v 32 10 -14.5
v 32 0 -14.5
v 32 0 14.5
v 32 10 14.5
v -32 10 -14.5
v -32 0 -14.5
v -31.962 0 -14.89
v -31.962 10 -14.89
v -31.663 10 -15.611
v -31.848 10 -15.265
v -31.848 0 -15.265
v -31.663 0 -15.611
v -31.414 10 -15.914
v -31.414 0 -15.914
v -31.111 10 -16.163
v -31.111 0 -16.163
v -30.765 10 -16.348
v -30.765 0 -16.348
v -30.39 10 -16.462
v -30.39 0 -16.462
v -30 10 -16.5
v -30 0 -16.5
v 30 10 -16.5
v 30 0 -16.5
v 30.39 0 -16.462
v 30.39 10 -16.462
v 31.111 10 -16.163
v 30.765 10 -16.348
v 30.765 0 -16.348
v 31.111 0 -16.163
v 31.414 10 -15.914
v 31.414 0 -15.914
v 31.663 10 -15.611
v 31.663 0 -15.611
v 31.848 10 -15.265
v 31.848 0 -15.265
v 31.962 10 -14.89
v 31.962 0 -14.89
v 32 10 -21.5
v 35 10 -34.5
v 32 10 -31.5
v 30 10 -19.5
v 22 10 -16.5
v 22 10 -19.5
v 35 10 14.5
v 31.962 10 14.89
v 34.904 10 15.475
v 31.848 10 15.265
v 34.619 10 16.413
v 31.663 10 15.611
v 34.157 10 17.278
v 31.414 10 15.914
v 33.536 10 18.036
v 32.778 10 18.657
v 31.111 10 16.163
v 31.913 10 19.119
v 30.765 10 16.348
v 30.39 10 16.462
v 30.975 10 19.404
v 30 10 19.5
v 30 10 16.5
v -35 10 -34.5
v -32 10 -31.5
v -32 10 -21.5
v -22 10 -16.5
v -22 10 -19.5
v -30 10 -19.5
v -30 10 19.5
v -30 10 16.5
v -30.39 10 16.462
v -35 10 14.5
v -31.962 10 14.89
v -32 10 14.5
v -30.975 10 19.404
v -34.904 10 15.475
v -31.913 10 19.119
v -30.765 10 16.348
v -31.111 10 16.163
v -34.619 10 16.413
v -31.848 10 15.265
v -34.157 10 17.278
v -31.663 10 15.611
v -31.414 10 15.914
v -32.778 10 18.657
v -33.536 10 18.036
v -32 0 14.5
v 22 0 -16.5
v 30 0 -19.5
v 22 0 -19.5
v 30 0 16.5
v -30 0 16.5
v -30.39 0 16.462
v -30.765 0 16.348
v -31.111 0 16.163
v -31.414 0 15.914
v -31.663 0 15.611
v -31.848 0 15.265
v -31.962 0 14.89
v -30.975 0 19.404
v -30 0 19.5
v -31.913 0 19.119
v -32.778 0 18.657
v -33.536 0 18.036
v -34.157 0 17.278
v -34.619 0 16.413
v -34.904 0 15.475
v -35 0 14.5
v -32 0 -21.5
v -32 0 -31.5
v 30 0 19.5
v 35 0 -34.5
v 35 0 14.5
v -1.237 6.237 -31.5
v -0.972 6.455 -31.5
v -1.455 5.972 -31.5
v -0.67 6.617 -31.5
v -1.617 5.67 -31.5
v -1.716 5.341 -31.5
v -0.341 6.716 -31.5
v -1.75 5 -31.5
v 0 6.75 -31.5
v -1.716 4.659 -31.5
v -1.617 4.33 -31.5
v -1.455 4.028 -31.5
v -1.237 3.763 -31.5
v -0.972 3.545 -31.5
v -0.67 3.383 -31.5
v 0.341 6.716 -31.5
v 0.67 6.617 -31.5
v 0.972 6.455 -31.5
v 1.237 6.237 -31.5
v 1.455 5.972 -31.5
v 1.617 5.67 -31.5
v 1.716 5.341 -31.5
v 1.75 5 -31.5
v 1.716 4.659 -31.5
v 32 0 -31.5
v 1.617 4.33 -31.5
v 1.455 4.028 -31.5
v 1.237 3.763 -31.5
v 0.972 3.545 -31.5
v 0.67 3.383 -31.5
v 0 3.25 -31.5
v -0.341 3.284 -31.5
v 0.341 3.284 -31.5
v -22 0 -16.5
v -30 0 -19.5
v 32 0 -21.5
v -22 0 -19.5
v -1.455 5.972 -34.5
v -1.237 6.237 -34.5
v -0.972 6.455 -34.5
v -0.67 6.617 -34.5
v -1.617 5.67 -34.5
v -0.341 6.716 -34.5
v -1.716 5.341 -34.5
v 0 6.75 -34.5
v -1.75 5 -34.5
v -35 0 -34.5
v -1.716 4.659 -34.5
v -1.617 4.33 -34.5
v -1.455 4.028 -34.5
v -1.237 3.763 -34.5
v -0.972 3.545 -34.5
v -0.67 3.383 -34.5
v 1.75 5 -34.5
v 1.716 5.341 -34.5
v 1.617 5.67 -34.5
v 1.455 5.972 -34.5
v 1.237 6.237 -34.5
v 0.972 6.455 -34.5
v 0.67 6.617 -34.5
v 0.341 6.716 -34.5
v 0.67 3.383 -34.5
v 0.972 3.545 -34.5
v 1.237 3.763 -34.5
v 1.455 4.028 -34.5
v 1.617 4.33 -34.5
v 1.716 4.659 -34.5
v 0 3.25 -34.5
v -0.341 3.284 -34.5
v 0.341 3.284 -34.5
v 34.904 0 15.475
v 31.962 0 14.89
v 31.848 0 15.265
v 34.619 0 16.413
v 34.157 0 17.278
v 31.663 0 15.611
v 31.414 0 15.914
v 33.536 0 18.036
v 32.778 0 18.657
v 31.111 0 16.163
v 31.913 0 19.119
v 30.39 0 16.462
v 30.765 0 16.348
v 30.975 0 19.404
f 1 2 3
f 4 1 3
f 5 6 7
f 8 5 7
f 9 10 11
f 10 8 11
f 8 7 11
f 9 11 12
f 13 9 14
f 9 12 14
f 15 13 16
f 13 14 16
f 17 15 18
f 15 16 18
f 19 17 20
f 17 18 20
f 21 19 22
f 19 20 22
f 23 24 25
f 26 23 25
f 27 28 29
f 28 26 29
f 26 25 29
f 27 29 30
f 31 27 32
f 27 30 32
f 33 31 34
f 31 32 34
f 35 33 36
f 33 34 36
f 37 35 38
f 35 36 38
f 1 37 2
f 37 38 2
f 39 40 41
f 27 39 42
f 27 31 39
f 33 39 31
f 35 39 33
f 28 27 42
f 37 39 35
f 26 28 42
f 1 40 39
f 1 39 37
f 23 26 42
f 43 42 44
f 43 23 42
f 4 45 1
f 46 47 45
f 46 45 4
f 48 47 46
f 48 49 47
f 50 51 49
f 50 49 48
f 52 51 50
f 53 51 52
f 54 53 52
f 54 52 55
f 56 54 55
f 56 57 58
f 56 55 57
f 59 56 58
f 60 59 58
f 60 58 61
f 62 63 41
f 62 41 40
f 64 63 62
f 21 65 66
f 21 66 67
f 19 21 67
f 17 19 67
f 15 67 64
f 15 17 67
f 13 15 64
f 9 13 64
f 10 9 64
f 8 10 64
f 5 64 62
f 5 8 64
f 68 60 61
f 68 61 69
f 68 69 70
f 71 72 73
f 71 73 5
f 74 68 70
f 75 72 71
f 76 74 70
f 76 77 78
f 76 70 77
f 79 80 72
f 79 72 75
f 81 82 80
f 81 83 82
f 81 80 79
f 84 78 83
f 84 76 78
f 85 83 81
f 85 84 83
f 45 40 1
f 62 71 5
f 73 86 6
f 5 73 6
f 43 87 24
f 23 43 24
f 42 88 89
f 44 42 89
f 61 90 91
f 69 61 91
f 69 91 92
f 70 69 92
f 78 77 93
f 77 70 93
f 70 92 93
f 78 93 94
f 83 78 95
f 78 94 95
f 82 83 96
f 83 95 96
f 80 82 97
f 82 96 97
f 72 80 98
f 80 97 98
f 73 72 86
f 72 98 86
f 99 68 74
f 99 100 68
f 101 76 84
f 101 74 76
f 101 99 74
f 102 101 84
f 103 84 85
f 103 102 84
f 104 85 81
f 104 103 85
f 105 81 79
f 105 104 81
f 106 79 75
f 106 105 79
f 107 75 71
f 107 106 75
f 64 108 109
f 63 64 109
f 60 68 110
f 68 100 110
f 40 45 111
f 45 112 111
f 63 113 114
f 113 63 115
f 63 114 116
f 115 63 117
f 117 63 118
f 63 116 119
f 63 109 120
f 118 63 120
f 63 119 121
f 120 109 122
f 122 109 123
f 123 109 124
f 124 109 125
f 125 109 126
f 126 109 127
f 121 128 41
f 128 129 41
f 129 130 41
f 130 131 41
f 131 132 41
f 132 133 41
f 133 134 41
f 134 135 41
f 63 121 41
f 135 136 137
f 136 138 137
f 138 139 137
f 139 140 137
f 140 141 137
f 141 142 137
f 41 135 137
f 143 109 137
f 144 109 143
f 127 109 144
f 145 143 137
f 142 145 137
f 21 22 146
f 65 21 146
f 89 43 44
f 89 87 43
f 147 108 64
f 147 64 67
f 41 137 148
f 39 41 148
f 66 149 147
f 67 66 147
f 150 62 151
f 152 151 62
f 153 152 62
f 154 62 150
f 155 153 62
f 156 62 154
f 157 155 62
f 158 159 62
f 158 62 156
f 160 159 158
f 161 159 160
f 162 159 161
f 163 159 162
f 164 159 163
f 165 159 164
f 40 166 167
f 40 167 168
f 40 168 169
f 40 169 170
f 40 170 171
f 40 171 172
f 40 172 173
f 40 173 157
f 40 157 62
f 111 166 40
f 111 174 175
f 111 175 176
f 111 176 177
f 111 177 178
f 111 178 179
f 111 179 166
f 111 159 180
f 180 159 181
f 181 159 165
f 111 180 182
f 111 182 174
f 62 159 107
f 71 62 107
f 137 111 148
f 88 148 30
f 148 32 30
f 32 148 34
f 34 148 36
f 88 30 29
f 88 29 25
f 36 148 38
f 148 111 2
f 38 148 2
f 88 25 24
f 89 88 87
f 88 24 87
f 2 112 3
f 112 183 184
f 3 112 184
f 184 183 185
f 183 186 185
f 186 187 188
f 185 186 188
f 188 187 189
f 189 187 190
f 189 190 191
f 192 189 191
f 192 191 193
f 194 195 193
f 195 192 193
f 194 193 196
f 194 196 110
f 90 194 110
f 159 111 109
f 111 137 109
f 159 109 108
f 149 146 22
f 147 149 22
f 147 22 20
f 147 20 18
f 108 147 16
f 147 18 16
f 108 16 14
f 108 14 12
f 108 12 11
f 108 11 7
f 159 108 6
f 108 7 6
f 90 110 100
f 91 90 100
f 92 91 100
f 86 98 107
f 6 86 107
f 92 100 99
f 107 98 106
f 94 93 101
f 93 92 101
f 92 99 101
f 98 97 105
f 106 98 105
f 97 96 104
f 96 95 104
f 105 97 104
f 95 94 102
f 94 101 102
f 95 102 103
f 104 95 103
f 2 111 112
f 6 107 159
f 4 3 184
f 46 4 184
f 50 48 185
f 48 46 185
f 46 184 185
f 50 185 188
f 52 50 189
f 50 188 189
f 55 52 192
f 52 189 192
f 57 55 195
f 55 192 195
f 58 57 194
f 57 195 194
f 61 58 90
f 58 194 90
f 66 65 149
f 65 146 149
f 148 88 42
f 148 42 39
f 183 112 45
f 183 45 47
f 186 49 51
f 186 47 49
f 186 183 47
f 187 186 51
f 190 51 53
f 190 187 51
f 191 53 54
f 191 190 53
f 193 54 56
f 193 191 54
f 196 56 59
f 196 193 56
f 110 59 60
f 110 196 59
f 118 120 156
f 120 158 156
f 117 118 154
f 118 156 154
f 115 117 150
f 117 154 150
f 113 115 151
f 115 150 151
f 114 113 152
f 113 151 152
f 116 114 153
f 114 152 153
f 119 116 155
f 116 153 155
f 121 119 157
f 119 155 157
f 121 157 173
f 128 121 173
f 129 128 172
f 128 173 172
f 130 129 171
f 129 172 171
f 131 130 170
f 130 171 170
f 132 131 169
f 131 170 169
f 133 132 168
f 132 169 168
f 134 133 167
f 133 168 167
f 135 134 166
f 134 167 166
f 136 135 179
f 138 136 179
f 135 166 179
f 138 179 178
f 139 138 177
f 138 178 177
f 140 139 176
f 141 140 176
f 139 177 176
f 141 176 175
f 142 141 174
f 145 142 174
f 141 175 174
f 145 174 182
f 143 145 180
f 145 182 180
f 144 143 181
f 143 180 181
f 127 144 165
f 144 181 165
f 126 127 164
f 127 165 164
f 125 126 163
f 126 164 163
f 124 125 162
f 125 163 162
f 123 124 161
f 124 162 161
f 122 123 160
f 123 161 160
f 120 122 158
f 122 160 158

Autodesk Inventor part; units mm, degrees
ref_plane "YZ Plane" through (0, 0, 0) normal (1, 0, 0) x (0, 1, 0)
ref_plane "XZ Plane" through (0, 0, 0) normal (0, 1, 0) x (-1, 0, 0)
ref_plane "XY Plane" through (0, 0, 0) normal (0, 0, 1) x (1, 0, 0)
sketch "Sketch1" plane through (0, 0, 0) normal (0, 1, 0) x (-1, 0, 0)
  line L0 (-30, 16.5) -> (30, 16.5)
  line L1 (32, 14.5) -> (32, -14.5)
  line L2 (-32, -14.5) -> (-32, 14.5)
  arc A0 (-32, -14.5) -> (-30, -16.5) centre (-30, -14.5) ccw
  arc A1 (-30, 16.5) -> (-32, 14.5) centre (-30, 14.5) ccw
  arc A2 (32, 14.5) -> (30, 16.5) centre (30, 14.5) ccw
  arc A3 (30, -16.5) -> (32, -14.5) centre (30, -14.5) ccw
  line L3 (-35, 14.5) -> (-35, -34.5)
  line L4 (35, -34.5) -> (35, 14.5)
  arc A4 (35, 14.5) -> (30, 19.5) centre (30, 14.5) ccw
  line L5 (30, 19.5) -> (-30, 19.5)
  arc A5 (-30, 19.5) -> (-35, 14.5) centre (-30, 14.5) ccw
  line L6 (35, -34.5) -> (-35, -34.5)
  line L7 (-22, -16.5) -> (-22, -19.5)
  line L8 (22, -16.5) -> (22, -19.5)
  line L9 (30, -16.5) -> (22, -16.5)
  line L10 (-22, -16.5) -> (-30, -16.5)
  line L11 (-30, -19.5) -> (-22, -19.5)
  line L12 (22, -19.5) -> (30, -19.5)
  line L13 (32, -31.5) -> (-32, -31.5)
  line L14 (-32, -31.5) -> (-32, -21.5)
  line L15 (-32, -14.5) -> (-32, 14.5)
  line L16 (32, 14.5) -> (32, -14.5)
  line L17 (32, -21.5) -> (32, -31.5)
  line L18 (-30, -19.5) -> (-32, -21.5)
  line L19 (32, -21.5) -> (30, -19.5)
  point P0 (0, 0)
  point P1 (32, -16.5)
  point P2 (32, 16.5)
  point P3 (-32, -16.5)
  point P4 (-32, -19.5)
  point P5 (32, -19.5)
  dimension "d0" = 64
  dimension "d1" = 33
  dimension "d2" = 32
  dimension "d3" = 16.5
  dimension "d4" = 2
  dimension "d5" = 3
  dimension "d6" = 70
  dimension "d9" = 10
  dimension "d10" = 10
  dimension "d11" = 20
  dimension "d12" = 3
  dimension "d13" = 2
  dimension "d14" = 2
  dimension "d15" = 2
  dimension "d16" = 2
extrude "Extrusion1" add sketch "Sketch1" along normal blind 10
sketch "Sketch2" plane through (35, 0, -34.5) normal (0, 0, -1) x (-1, 0, 0)
  line L0 (0, 10) -> (70, 0)
  line L1 (70, 10) -> (0, 0)
  circle A0 centre (35, 5) radius 1.75
  point P0 (35, 0)
  dimension "d19" = 3.5
extrude "Extrusion2" cut sketch "Sketch2" against normal blind 10
equation "\"d14\" = d13"
equation "\"d15\" = d13"
equation "\"d16\" = d15"
equation "\"BendRadius\" = Thickness"
equation "\"BendReliefWidth\" = Thickness"
equation "\"BendReliefDepth\" = 0.5 * Thickness"
equation "\"CornerReliefSize\" = 4 * Thickness"
equation "\"MinimumRemnant\" = 2 * Thickness"
equation "\"TransitionRadius\" = BendRadius"
equation "\"JacobiRadiusSize\" = BendRadius"
equation "\"GapSize\" = Thickness"
equation "\"Thickness\" = 0.5"
properties part number "dcdcSupport"
